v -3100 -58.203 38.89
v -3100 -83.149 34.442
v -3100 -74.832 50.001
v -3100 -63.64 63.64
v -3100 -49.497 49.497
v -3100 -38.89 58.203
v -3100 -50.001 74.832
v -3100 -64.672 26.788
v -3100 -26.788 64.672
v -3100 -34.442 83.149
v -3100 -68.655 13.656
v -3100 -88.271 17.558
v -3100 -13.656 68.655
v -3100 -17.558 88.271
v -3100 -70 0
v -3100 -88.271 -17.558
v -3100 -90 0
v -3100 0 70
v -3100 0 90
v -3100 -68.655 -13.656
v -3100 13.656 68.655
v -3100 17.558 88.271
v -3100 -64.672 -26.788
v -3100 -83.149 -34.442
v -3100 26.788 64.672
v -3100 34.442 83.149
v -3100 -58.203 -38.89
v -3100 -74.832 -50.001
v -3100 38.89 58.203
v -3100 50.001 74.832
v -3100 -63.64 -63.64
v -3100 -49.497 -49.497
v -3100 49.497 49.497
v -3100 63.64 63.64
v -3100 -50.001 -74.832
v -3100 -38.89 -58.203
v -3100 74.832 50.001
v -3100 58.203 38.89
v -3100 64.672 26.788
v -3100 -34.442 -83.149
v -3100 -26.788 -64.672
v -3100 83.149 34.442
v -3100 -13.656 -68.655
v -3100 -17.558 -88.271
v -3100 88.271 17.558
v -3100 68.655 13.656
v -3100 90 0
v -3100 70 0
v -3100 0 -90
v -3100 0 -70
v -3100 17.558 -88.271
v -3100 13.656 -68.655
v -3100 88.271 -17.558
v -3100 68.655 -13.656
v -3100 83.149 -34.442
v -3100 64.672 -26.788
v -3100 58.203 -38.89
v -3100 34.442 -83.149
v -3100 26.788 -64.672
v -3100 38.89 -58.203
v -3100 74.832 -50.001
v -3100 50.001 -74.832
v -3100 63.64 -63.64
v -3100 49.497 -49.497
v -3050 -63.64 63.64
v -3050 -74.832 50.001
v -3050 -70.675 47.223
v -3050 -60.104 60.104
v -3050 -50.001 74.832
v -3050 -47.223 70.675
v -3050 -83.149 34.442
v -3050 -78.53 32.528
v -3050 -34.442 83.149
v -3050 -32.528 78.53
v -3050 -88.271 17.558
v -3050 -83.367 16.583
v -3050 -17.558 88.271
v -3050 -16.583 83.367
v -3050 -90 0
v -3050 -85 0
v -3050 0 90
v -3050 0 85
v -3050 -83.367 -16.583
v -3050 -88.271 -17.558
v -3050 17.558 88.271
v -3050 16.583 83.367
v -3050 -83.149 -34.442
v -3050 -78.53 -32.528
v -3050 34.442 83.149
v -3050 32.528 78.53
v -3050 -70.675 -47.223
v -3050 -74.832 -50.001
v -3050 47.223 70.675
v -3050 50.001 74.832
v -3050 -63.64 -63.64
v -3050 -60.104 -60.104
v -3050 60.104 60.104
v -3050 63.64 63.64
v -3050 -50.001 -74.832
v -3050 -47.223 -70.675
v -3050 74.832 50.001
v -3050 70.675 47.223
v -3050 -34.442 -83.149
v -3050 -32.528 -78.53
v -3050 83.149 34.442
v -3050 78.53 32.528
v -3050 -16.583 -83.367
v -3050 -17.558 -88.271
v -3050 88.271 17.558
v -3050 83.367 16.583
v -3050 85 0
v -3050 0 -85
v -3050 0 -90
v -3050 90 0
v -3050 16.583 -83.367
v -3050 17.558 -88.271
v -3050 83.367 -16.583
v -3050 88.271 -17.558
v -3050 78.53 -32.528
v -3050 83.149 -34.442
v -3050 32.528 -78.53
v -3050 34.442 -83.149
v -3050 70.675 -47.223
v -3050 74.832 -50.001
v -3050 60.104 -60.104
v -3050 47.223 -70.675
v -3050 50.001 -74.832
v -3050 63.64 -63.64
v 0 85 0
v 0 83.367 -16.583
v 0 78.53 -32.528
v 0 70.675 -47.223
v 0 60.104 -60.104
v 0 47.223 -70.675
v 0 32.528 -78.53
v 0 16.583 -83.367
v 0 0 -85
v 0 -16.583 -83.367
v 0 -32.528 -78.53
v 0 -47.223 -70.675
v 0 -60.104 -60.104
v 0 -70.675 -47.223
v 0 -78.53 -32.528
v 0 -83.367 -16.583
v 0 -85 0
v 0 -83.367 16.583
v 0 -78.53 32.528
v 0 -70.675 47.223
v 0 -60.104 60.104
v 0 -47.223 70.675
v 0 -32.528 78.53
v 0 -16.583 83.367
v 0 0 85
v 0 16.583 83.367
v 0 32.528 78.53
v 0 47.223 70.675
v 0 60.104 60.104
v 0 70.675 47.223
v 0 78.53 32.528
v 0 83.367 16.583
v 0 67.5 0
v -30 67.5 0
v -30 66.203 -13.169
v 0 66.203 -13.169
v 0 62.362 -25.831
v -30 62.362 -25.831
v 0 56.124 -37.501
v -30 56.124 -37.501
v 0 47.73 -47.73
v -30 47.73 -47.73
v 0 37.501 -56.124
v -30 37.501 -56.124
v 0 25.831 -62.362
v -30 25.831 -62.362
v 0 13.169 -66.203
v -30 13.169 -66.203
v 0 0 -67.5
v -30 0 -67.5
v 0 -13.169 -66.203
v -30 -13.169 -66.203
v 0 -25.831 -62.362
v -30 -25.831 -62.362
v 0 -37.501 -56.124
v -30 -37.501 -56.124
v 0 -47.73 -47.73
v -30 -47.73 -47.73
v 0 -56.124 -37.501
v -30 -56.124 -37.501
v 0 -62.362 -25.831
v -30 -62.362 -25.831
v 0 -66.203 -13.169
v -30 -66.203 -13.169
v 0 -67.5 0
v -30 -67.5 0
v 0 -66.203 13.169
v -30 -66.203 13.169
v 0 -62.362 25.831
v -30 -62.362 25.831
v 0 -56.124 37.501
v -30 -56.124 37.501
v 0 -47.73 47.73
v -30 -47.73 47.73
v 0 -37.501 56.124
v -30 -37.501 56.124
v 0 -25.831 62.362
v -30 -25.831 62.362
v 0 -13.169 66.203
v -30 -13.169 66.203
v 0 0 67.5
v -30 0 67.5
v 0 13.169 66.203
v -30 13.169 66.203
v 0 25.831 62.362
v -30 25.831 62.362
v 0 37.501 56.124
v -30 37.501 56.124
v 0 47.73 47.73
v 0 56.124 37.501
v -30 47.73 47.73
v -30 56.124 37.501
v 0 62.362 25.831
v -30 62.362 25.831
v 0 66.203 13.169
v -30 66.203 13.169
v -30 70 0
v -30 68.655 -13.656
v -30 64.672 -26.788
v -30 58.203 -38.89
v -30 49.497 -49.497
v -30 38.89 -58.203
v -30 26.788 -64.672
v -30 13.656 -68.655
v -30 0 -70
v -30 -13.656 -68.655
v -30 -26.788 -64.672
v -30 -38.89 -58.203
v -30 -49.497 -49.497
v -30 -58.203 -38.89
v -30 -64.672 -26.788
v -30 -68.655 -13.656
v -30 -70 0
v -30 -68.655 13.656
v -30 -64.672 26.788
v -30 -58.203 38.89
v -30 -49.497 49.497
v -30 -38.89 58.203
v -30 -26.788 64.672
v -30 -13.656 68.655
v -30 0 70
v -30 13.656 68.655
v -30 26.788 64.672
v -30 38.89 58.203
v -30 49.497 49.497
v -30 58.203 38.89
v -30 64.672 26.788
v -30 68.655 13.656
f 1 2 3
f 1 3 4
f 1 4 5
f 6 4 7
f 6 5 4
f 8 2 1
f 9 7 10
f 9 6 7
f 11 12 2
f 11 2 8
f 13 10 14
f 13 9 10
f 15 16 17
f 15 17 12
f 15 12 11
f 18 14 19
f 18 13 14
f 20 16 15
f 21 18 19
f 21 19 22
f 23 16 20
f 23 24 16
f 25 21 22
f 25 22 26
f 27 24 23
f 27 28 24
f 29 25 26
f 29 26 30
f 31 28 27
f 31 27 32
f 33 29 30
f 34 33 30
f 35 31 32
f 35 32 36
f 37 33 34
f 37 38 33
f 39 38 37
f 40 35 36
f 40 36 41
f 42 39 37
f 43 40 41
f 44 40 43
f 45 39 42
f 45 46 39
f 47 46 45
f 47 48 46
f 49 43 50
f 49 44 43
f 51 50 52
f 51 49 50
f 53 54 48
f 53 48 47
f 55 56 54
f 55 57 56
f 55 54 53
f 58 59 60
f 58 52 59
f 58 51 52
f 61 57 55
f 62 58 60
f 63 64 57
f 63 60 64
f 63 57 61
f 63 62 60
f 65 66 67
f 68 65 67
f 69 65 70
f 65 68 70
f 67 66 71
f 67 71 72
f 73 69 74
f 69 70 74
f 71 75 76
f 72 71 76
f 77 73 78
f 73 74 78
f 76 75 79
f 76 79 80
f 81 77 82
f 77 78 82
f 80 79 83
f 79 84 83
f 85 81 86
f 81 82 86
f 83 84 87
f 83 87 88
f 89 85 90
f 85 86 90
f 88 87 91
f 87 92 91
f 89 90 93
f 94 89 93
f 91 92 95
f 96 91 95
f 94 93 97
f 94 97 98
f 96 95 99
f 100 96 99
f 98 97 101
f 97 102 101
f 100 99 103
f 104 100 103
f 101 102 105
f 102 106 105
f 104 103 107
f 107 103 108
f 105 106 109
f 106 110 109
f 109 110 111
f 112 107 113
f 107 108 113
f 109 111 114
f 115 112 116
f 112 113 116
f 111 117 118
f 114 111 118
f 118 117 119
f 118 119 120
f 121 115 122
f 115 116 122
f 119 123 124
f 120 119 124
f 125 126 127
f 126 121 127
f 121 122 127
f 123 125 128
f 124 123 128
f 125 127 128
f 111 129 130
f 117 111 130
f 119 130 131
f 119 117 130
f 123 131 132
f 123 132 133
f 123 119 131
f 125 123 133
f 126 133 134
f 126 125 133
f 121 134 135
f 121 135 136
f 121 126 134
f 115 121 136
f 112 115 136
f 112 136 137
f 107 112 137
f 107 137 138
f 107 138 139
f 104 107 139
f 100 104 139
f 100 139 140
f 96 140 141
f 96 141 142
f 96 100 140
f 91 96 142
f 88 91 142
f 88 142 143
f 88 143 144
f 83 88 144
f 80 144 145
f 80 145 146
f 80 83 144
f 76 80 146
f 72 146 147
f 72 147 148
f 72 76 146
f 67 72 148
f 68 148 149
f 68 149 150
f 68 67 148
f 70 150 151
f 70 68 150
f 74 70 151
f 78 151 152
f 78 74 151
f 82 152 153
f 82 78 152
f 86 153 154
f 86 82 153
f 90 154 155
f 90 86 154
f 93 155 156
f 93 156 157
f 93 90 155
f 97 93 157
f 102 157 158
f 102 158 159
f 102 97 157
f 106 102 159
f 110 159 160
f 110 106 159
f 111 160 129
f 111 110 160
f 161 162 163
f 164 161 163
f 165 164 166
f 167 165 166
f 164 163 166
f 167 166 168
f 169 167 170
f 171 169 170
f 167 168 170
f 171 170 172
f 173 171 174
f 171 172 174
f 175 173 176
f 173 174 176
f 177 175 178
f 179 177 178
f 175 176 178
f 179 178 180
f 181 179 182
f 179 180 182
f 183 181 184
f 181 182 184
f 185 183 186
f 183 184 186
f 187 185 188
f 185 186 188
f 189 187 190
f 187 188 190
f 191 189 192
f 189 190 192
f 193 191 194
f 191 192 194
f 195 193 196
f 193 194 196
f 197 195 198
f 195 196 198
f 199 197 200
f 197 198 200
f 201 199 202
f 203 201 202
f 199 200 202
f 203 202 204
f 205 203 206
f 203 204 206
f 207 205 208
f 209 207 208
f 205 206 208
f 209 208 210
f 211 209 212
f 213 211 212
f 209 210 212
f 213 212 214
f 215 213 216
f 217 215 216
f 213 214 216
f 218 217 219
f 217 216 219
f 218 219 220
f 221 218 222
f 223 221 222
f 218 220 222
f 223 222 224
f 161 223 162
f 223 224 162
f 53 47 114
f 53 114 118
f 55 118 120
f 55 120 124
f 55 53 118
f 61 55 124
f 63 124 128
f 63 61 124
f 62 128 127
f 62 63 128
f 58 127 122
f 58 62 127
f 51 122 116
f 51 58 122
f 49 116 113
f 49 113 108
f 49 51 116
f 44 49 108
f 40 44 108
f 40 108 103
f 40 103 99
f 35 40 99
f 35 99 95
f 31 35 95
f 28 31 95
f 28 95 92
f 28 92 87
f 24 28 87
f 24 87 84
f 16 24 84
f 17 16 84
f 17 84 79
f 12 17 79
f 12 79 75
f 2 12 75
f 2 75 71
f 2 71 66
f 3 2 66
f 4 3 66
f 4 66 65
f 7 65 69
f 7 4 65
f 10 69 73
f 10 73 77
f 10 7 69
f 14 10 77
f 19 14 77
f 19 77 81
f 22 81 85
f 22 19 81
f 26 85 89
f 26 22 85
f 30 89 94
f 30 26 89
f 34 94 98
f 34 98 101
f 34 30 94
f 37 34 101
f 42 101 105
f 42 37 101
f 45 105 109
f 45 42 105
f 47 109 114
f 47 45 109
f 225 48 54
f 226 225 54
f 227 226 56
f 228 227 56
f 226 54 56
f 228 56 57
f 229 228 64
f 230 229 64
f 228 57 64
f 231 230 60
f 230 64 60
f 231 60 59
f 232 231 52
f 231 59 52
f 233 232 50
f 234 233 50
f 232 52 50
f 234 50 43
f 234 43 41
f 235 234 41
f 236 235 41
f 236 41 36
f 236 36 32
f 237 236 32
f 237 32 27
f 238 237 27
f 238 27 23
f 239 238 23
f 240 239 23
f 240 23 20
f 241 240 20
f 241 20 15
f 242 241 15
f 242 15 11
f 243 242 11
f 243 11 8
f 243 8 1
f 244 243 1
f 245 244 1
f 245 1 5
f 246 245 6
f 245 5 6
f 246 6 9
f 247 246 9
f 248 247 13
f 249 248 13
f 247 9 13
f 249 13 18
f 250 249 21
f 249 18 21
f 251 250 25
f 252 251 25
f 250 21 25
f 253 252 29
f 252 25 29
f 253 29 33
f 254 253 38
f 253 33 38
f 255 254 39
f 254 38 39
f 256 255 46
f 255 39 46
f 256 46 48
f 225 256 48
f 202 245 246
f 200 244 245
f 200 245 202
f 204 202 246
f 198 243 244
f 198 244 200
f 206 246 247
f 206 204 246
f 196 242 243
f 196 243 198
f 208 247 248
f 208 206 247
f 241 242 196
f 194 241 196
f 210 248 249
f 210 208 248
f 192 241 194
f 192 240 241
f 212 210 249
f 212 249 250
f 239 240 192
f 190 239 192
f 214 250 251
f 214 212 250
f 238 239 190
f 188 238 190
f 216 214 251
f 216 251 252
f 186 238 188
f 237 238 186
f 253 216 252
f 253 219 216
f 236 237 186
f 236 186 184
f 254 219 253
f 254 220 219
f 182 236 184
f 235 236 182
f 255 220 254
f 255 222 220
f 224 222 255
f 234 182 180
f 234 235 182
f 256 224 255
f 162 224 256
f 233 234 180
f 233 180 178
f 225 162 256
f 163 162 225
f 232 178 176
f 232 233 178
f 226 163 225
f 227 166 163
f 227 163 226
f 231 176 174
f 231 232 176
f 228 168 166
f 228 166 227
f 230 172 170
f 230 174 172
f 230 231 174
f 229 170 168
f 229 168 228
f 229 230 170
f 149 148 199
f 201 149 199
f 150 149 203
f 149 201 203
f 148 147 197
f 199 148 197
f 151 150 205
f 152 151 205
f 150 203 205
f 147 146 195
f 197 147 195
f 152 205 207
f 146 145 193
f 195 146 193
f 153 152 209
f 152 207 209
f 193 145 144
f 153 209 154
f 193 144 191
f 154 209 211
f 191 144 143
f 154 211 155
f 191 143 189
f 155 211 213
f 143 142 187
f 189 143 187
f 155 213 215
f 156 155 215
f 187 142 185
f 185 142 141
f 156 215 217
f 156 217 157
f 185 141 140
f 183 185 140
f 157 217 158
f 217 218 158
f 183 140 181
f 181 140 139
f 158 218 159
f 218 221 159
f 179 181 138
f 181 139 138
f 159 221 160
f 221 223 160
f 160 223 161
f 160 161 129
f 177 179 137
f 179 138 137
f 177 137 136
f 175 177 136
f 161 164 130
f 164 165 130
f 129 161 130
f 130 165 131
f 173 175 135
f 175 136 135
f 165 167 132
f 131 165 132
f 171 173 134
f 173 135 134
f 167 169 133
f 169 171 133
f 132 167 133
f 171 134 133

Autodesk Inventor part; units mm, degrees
ref_plane "YZ Plane" through (0, 0, 0) normal (1, 0, 0) x (0, 1, 0)
ref_plane "XZ Plane" through (0, 0, 0) normal (0, 1, 0) x (-1, 0, 0)
ref_plane "XY Plane" through (0, 0, 0) normal (0, 0, 1) x (1, 0, 0)
sketch "Эскиз1" plane through (0, 0, 0) normal (0, 0, 1) x (1, 0, 0)
  line L0 (0, 0) -> (-3944.82, 0)
  line L1 (0, 0) -> (0, 85)
  line L2 (0, 85) -> (-3050, 85)
  line L3 (-3050, 85) -> (-3050, 90)
  line L4 (-3050, 90) -> (-3100, 90)
  line L5 (-3100, 90) -> (-3100, 0)
  line L6 (0, 67.5) -> (-30, 67.5)
  line L7 (-30, 67.5) -> (-30, 70)
  line L8 (-30, 70) -> (-3100, 70)
  dimension "d0" = 135
  dimension "d1" = 30
  dimension "d2" = 140
  dimension "d4" = 50
  dimension "d5" = 180
  dimension "d6" = 170
  dimension "d7" = 3100
revolve "Вращение1" add sketch "Эскиз1" angle 360 about axis through (0, 0, 0) along (-1, 0, 0) contours L6 L7 L8 L5 L4 L3 L2 L1
properties part number "Lift.02.00.00.02" material "Сталь нержавеющая, 440C"
